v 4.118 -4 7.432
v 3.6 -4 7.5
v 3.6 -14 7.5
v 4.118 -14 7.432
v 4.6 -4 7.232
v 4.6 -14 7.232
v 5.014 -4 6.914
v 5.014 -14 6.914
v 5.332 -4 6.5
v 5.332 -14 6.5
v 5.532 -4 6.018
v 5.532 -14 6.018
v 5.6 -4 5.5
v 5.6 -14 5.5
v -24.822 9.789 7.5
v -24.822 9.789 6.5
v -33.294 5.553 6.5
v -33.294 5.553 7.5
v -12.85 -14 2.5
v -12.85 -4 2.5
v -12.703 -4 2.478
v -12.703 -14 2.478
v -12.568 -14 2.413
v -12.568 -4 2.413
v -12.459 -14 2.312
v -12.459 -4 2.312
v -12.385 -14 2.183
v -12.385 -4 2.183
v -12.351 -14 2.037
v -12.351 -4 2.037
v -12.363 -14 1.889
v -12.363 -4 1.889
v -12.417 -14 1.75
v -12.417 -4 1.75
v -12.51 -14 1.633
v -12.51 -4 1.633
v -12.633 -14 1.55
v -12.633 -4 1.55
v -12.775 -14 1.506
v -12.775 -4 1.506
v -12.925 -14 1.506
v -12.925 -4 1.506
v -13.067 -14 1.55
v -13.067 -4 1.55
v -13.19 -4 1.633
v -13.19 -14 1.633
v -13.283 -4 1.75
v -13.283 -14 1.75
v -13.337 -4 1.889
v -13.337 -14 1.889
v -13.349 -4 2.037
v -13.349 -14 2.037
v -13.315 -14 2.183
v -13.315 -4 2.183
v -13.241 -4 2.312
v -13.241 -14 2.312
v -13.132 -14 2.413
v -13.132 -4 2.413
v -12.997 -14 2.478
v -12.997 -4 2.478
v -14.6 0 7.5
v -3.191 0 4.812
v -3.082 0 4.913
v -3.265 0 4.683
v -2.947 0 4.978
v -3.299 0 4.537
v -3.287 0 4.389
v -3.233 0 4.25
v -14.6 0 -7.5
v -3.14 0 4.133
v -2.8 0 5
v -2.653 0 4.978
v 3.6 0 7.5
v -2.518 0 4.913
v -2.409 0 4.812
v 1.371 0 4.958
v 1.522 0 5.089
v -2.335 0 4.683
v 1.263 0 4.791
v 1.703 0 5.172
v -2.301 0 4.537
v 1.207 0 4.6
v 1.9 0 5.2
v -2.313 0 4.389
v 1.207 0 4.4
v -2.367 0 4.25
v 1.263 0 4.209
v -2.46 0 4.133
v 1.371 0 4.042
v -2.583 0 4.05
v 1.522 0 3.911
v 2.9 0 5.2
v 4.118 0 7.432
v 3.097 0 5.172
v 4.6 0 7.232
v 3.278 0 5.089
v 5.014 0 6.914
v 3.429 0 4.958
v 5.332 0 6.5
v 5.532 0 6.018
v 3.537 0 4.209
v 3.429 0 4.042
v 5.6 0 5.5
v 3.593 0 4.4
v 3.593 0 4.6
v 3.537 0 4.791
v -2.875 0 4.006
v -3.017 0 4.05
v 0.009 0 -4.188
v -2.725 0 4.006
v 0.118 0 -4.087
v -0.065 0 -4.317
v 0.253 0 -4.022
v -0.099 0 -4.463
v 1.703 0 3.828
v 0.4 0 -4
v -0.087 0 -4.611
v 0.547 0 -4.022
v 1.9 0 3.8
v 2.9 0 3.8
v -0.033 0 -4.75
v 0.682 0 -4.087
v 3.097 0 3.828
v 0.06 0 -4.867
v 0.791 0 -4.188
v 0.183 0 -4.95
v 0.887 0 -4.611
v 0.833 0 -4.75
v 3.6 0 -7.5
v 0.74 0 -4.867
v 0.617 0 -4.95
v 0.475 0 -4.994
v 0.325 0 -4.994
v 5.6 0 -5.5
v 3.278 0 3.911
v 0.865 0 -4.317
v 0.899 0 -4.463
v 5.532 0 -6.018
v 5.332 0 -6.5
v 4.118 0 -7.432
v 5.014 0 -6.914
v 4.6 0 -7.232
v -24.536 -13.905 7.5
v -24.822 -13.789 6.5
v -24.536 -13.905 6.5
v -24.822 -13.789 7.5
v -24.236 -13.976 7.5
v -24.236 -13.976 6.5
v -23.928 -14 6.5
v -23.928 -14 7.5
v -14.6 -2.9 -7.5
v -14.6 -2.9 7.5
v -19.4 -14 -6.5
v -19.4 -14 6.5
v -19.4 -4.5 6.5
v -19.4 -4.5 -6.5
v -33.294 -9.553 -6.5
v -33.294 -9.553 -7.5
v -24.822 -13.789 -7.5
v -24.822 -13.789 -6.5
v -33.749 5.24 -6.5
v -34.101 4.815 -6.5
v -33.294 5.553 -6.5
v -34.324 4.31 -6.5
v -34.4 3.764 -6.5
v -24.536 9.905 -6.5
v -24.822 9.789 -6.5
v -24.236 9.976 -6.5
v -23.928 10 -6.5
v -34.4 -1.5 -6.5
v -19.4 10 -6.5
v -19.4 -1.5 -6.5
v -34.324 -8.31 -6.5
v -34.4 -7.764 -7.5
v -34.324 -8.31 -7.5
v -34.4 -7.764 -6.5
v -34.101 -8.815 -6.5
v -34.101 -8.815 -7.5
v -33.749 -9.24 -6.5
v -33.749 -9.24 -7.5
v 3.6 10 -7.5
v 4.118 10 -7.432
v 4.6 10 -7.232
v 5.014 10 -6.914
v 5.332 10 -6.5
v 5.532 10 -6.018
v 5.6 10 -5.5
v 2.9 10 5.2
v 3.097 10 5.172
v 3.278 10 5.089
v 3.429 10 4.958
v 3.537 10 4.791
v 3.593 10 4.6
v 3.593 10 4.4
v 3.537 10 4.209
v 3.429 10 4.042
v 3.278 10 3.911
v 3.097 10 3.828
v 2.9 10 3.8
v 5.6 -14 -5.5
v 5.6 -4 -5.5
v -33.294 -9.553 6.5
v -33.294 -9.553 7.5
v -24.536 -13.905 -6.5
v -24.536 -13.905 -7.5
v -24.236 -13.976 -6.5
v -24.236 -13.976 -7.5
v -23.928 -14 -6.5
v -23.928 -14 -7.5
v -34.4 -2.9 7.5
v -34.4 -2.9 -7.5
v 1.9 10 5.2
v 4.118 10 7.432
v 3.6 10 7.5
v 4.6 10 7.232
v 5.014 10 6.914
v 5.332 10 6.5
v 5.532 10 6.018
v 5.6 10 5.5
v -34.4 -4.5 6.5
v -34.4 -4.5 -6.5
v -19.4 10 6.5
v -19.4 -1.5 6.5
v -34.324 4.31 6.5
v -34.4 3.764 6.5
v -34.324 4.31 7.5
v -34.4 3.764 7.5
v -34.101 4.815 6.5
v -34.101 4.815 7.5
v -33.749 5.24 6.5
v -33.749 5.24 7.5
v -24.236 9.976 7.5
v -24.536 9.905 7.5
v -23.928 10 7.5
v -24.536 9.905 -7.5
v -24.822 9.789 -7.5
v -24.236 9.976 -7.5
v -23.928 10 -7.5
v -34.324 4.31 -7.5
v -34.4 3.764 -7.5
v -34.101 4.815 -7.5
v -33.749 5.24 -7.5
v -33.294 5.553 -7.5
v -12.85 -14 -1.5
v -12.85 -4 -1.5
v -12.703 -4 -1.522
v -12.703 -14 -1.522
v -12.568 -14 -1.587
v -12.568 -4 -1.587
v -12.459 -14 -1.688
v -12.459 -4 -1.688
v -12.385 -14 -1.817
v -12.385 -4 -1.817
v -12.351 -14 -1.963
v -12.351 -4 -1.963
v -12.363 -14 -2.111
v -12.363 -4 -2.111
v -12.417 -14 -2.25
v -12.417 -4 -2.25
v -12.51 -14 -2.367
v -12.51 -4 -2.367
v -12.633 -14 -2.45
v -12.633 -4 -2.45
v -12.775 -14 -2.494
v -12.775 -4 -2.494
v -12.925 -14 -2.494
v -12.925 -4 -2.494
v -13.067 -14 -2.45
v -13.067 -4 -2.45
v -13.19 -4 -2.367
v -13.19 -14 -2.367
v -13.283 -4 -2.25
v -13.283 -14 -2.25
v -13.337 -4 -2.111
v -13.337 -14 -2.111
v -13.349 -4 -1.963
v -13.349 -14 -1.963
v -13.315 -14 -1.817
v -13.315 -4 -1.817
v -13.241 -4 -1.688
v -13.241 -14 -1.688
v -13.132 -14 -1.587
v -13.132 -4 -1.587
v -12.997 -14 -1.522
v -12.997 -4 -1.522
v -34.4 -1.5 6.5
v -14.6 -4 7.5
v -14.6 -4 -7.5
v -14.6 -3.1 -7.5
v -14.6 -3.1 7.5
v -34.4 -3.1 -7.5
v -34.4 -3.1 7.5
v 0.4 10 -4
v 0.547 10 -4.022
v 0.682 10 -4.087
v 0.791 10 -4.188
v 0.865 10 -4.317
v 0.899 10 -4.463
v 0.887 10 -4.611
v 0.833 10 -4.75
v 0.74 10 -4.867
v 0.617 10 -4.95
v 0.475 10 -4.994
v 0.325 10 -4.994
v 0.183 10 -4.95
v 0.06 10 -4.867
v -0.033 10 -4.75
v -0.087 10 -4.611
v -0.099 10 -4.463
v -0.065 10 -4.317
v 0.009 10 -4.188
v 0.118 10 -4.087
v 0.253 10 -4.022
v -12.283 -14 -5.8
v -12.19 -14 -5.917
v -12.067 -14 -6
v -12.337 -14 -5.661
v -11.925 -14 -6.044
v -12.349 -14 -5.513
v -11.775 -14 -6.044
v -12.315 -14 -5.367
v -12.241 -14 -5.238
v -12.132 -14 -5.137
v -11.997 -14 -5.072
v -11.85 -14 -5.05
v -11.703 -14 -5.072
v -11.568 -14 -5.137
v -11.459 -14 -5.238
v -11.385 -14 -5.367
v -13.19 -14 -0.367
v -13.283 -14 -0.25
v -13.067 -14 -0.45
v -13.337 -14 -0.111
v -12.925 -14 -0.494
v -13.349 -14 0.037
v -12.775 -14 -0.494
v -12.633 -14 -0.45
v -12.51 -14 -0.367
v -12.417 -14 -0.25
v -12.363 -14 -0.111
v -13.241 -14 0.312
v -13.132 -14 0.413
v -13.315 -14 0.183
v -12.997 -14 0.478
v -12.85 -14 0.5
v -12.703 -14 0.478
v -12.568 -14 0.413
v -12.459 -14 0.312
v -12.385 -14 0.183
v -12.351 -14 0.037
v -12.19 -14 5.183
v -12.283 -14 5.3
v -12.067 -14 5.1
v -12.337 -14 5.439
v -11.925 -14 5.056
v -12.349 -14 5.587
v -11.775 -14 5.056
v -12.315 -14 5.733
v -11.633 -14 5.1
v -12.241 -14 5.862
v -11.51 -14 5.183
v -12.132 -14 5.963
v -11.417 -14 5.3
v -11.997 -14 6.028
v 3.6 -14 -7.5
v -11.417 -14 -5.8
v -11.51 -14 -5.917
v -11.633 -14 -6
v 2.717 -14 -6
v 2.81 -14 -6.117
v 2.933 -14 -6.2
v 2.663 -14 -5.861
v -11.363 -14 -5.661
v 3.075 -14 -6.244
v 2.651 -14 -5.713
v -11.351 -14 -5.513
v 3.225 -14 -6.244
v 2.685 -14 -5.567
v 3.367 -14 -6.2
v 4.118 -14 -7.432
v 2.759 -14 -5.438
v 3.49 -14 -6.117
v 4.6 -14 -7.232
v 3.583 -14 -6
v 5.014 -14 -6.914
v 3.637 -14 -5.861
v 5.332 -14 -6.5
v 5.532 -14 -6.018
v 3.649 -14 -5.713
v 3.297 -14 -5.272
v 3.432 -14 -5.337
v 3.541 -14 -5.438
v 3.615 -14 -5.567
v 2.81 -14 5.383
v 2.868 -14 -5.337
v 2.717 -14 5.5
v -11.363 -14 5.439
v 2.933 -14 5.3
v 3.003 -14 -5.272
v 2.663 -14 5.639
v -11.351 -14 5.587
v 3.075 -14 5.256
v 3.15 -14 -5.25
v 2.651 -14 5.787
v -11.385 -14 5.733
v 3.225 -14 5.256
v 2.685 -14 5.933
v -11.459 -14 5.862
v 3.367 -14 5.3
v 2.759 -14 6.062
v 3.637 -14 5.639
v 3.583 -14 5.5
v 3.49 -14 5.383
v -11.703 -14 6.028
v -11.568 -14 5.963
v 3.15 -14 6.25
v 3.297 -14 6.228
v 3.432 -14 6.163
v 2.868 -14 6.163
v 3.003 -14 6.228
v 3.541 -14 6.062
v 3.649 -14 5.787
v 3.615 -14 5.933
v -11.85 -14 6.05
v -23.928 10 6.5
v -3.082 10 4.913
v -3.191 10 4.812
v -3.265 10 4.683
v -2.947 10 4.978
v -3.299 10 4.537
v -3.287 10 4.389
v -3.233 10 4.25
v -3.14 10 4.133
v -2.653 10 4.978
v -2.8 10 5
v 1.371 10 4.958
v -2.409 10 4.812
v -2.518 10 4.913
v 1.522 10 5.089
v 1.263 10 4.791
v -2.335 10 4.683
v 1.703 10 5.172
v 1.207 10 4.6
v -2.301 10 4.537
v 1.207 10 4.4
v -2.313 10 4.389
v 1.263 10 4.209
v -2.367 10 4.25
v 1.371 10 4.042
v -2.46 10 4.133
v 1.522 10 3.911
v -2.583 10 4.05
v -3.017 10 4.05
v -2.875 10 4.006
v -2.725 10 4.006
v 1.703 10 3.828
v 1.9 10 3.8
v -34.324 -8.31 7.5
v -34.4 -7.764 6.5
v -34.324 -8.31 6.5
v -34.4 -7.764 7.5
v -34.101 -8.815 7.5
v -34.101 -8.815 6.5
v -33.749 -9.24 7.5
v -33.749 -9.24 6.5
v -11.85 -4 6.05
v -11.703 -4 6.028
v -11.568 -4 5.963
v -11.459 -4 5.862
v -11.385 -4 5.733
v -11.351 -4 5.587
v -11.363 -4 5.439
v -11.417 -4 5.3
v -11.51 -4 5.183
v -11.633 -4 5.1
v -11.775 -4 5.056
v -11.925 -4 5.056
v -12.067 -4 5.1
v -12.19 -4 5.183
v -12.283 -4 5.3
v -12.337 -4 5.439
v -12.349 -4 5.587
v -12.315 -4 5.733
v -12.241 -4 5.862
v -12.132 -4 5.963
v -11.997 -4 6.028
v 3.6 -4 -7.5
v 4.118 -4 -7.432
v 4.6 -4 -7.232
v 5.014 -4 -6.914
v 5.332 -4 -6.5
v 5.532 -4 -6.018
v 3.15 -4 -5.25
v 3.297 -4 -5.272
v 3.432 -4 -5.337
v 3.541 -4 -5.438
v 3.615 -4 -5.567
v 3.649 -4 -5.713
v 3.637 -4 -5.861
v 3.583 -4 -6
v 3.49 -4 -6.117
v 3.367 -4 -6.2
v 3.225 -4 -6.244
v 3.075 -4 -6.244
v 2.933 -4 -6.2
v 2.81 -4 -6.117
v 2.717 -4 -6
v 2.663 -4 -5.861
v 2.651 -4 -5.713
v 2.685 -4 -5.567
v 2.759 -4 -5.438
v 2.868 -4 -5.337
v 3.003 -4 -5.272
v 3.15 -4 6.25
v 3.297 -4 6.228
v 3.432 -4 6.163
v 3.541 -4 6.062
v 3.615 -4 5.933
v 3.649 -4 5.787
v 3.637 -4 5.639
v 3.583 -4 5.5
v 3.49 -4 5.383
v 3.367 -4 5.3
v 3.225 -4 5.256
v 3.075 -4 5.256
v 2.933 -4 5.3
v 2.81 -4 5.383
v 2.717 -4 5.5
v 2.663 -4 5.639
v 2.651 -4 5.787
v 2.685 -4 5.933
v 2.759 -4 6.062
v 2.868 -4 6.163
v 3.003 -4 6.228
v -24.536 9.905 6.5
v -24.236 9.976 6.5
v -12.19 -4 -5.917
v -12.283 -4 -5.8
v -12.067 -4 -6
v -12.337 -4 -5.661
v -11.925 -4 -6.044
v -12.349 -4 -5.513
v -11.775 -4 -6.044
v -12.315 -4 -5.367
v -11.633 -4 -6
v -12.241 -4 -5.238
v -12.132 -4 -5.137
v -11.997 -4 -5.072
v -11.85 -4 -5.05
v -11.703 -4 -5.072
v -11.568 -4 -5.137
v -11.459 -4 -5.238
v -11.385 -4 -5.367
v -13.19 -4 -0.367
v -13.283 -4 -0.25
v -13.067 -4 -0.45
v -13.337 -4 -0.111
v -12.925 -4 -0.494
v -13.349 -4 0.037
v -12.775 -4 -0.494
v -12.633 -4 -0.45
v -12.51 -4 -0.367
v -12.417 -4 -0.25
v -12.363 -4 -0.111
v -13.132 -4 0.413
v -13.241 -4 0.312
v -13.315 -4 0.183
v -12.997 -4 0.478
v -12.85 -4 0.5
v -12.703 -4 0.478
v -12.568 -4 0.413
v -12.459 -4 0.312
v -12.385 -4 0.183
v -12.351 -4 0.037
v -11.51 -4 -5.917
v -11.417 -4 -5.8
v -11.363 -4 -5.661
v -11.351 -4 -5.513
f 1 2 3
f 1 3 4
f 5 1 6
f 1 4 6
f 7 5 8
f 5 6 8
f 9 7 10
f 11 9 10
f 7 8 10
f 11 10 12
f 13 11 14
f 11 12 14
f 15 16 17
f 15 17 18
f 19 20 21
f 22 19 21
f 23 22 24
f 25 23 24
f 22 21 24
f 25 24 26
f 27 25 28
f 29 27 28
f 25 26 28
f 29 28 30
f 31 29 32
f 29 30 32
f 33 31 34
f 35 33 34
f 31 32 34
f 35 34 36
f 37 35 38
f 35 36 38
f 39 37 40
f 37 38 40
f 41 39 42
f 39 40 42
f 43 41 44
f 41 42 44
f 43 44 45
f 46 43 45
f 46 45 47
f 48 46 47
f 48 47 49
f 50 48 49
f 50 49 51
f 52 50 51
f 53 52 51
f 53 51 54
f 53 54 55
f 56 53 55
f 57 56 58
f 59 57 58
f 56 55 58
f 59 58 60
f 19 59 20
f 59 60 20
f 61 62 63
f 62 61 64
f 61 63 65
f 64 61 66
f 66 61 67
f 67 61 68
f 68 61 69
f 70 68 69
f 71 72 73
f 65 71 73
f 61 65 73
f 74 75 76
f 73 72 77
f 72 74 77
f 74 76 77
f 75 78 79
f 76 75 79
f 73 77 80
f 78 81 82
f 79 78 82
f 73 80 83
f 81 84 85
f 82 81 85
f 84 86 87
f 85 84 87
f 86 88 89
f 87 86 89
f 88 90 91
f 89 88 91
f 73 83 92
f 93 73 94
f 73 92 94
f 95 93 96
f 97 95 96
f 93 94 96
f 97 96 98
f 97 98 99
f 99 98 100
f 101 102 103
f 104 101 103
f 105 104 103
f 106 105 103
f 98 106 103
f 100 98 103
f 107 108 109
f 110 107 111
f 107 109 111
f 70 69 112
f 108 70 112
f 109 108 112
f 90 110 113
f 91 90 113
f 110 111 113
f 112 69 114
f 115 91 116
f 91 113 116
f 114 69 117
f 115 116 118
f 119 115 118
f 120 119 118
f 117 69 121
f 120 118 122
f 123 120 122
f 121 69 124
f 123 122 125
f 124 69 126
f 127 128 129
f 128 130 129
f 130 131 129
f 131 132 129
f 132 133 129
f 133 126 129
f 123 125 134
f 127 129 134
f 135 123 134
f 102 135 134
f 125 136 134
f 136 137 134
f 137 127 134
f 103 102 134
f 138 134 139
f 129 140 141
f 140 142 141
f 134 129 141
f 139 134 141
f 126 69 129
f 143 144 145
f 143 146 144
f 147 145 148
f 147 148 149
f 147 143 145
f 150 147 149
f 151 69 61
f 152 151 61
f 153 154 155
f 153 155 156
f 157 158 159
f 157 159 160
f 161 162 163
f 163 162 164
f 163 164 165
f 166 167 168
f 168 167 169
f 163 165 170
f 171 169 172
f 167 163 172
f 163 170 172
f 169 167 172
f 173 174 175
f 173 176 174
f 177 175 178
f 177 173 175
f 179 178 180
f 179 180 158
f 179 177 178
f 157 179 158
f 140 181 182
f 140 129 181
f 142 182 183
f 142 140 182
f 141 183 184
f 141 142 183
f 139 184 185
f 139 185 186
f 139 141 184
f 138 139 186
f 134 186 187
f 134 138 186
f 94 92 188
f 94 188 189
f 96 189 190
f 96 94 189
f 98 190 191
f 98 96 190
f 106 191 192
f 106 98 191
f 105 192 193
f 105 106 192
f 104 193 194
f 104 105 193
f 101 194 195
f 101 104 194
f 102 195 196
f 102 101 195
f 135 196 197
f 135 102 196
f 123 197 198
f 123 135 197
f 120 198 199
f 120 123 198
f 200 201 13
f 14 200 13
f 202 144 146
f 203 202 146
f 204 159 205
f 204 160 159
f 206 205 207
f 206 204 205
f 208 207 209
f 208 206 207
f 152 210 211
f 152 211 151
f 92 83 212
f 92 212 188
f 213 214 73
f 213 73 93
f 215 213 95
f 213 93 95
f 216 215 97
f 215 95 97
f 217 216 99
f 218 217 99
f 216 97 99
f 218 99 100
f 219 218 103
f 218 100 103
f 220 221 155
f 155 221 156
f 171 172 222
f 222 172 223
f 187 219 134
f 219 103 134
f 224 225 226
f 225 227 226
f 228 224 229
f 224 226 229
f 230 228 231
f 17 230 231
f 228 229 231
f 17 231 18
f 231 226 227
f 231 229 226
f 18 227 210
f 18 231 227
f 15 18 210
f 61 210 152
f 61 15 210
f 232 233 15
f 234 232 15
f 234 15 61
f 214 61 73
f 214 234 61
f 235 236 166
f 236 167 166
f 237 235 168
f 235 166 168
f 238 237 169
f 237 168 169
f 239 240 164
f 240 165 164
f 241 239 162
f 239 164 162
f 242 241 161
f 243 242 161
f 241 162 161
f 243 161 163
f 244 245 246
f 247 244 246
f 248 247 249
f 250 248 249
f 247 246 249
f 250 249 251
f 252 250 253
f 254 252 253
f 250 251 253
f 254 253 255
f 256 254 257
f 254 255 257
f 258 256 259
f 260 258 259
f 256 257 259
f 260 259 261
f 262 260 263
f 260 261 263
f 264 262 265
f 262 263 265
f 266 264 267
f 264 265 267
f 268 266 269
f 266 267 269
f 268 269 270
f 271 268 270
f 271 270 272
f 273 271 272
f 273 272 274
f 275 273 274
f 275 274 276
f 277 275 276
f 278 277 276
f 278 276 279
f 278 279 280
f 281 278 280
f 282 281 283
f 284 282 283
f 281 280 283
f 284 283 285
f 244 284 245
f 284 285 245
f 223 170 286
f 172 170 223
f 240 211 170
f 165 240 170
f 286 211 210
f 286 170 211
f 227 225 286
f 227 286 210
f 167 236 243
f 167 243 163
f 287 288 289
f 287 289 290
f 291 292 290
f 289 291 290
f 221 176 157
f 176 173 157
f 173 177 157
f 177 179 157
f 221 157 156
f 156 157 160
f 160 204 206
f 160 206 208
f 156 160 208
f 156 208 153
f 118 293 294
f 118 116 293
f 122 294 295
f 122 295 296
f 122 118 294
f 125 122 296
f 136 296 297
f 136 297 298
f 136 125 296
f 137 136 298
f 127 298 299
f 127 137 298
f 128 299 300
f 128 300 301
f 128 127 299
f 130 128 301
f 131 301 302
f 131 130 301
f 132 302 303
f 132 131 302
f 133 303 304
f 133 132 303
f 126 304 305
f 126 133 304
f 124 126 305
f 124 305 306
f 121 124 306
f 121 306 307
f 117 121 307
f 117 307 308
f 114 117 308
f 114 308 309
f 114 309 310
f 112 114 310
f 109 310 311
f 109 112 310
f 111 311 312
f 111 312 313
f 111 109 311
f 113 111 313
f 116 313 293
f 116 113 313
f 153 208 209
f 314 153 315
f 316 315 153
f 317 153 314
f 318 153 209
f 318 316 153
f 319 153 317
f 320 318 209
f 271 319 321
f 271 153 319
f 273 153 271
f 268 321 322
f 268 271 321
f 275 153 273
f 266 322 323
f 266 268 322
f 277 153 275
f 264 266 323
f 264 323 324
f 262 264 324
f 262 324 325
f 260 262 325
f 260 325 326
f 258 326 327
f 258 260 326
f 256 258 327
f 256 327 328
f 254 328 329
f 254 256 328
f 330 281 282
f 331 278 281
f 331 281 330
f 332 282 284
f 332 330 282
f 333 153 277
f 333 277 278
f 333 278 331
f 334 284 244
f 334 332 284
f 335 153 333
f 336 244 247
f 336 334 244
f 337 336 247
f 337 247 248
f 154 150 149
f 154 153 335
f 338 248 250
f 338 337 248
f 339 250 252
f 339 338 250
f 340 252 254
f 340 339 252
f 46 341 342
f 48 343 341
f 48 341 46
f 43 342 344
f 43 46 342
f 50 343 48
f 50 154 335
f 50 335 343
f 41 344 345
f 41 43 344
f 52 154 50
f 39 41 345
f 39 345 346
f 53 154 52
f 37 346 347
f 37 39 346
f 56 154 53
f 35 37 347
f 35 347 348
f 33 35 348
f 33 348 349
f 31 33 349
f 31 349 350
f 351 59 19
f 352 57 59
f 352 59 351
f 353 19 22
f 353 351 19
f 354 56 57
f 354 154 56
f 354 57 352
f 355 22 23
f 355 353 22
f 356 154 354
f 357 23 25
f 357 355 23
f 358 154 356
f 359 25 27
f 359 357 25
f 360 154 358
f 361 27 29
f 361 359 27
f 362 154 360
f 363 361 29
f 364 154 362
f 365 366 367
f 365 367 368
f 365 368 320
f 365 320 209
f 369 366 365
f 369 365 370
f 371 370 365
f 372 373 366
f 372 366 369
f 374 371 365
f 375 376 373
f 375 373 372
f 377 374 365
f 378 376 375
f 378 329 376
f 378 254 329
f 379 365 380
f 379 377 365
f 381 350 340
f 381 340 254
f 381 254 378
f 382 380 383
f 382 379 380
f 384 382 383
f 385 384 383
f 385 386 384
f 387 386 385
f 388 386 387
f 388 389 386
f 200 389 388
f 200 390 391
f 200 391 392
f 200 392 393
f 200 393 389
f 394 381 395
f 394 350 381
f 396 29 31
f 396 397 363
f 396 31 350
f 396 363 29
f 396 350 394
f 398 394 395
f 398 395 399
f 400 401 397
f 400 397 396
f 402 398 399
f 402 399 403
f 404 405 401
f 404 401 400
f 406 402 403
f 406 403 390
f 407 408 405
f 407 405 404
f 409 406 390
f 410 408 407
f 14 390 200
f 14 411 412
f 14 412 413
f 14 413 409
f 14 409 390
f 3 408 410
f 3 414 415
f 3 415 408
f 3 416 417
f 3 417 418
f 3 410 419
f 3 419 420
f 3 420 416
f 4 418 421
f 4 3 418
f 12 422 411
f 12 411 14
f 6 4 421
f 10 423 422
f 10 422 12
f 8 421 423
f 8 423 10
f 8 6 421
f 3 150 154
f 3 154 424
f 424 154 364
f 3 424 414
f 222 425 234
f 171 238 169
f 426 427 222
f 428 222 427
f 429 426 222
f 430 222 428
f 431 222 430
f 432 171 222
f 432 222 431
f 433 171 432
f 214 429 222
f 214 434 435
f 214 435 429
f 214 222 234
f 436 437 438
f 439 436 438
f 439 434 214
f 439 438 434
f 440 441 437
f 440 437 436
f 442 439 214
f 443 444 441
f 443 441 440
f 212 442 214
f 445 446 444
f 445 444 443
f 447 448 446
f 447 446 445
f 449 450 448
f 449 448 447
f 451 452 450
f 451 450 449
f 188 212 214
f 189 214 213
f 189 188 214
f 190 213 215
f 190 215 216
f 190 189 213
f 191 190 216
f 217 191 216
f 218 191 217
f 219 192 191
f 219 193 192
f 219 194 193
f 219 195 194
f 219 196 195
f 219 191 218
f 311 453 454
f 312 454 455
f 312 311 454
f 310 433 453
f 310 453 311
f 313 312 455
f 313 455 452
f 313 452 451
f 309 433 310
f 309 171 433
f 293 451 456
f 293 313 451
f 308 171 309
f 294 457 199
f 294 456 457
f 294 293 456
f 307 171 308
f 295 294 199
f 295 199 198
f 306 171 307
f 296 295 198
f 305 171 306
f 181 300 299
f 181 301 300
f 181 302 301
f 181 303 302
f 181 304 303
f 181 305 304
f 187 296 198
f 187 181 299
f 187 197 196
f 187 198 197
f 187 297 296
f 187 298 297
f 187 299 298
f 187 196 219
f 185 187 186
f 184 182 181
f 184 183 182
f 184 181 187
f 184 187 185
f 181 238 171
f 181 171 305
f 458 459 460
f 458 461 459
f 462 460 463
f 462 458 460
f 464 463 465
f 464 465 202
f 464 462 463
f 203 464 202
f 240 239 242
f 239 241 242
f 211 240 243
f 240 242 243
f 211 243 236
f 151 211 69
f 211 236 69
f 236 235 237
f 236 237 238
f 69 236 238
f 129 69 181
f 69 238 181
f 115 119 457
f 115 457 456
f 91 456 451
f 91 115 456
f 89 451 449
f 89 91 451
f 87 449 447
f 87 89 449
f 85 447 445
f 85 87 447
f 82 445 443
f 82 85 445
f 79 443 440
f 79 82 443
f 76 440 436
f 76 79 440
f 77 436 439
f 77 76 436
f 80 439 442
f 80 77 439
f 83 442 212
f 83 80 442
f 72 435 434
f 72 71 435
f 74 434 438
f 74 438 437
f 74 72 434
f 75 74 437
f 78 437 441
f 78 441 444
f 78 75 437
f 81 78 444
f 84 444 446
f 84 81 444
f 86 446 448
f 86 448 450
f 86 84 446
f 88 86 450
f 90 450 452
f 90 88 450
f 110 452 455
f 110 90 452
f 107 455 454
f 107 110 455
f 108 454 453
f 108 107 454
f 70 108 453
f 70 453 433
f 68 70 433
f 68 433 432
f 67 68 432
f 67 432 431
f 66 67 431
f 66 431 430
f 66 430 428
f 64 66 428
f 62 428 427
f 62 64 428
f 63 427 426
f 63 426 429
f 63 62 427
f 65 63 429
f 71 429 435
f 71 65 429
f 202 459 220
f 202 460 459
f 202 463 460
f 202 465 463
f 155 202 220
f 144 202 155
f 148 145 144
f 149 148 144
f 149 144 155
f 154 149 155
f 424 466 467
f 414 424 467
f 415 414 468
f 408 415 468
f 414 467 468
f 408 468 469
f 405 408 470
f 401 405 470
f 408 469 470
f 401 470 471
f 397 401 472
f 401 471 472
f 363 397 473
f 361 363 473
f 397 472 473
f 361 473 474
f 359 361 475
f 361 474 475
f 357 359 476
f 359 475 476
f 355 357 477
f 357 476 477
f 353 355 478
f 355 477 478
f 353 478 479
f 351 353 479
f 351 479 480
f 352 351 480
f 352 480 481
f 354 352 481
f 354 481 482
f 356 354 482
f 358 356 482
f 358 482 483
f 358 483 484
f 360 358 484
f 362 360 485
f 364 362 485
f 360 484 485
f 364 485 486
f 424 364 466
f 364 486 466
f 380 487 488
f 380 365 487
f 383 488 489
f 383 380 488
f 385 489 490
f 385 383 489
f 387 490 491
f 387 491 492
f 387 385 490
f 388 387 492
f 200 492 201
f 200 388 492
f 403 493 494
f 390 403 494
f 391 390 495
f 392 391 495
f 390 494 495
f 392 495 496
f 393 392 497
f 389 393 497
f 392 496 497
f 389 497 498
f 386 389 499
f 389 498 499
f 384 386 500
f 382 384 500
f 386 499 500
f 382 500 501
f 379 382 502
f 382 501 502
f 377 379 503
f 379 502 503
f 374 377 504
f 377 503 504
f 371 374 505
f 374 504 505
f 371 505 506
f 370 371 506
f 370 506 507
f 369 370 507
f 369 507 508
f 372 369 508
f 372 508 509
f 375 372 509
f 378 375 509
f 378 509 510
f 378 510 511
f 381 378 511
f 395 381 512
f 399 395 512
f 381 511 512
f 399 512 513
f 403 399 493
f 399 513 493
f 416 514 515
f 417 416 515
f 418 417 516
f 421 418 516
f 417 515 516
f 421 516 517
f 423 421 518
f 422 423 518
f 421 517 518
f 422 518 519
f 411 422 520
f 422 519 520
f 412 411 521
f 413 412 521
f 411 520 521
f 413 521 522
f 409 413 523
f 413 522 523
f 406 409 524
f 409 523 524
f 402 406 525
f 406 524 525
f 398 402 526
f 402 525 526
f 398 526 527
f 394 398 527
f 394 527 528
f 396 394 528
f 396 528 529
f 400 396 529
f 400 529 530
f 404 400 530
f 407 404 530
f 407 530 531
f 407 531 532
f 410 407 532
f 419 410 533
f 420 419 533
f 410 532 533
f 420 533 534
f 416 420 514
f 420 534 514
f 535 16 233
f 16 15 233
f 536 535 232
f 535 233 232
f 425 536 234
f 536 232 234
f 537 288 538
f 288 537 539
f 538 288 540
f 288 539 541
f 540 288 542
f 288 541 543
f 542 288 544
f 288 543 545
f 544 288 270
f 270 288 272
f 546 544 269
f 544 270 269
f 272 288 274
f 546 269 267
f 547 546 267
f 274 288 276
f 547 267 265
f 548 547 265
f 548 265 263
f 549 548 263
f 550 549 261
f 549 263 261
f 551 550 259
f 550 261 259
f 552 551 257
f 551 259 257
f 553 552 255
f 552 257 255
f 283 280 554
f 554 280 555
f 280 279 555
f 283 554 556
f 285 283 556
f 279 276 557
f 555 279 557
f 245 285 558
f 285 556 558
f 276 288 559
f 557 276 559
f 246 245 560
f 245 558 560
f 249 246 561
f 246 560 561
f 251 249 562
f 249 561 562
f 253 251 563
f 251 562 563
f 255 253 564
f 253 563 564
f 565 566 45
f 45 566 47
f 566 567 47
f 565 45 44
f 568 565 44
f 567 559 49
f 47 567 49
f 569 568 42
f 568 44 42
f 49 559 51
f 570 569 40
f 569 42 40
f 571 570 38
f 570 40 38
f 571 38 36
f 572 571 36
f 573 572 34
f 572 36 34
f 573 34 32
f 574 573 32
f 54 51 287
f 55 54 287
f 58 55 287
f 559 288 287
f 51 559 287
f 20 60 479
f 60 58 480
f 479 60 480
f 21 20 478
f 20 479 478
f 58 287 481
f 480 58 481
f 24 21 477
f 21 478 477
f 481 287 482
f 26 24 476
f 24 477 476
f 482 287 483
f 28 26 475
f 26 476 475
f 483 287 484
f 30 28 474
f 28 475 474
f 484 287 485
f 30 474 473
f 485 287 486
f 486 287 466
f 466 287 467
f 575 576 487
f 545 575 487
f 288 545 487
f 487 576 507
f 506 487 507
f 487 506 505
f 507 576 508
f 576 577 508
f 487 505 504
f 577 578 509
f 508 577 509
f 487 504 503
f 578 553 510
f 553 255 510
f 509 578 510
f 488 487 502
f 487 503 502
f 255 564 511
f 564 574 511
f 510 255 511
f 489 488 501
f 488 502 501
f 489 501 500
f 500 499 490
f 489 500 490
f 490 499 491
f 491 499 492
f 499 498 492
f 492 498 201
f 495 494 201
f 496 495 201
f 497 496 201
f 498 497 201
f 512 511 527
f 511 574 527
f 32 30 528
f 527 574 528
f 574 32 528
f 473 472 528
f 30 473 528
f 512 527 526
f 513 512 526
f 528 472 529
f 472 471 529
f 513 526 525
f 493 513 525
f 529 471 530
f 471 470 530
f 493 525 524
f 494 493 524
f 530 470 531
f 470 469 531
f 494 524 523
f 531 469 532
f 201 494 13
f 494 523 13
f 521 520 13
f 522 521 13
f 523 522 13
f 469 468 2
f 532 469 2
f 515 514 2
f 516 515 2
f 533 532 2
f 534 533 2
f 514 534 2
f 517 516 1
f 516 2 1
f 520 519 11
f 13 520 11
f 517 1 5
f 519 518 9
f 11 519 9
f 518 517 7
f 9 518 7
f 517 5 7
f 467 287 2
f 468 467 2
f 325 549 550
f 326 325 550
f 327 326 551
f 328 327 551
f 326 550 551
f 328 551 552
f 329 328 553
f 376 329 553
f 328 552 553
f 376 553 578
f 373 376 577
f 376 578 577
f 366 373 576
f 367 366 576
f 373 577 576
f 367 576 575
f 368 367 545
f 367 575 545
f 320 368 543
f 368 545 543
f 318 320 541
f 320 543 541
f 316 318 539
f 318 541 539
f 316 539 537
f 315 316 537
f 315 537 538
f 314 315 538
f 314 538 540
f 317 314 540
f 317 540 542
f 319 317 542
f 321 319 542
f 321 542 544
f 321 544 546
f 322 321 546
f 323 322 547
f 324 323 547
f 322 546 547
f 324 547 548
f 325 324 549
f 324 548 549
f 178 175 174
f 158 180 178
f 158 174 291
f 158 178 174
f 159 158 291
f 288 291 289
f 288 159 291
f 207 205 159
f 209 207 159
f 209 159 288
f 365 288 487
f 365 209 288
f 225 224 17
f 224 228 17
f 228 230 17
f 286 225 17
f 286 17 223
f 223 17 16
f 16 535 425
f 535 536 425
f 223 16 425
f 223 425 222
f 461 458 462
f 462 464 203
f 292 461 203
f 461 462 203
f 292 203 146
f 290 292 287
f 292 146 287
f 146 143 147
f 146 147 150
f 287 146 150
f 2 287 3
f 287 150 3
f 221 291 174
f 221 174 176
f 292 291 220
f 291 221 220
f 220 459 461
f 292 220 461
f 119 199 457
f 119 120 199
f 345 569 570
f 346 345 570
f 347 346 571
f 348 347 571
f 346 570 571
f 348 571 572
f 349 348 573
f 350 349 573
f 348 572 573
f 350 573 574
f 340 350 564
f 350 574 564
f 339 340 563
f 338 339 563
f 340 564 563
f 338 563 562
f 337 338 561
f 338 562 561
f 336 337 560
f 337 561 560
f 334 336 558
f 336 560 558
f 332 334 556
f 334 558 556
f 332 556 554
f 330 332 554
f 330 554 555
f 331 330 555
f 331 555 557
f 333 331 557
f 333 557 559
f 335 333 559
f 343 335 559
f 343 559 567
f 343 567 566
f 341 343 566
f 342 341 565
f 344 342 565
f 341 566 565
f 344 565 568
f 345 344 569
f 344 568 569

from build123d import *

# Parameters (mm, degrees)
SKETCH1_W           = 40
SKETCH1_H           = 15
SKETCH1_R           = 0.5
BOSS_EXTRUDE1_DEPTH = 3
SKETCH2_R           = 0.5
BOSS_EXTRUDE2_DEPTH = 7
BOSS_EXTRUDE3_START = 4
SKETCH3_W           = 40
SKETCH3_H           = 15
BOSS_EXTRUDE3_DEPTH = 10
SKETCH4_W           = 19.8
SKETCH4_H           = 15
BOSS_EXTRUDE4_DEPTH = 2.9
BOSS_EXTRUDE5_START = 4
SKETCH4_2_W         = 19.8
SKETCH4_2_H         = 15
BOSS_EXTRUDE5_DEPTH = 0.9
SKETCH5_W           = 15
SKETCH5_H           = 13
CUT_EXTRUDE1_DEPTH  = 4.5
CUT_EXTRUDE2_START  = -17
SKETCH5_2_W         = 15
SKETCH5_2_H         = 13
CUT_EXTRUDE2_DEPTH  = 9.5
SKETCH7_R           = 0.5
CUT_EXTRUDE3_DEPTH  = 10
CHAMFER1_SIZE       = 5
CHAMFER1_SIZE2      = 10
FILLET2_R           = 2
CHAMFER2_SIZE       = 5
CHAMFER2_SIZE2      = 10
FILLET3_R           = 2
FILLET4_R           = 2
FILLET5_R           = 2


with BuildPart() as part:
    # Sketch1 → Boss-Extrude1 (new body)
    with BuildSketch(Plane(origin=(0, 0, 0), x_dir=(1, 0, 0), z_dir=(0, 1, 0))):
        with Locations((-14.4, 0)):
            Rectangle(SKETCH1_W, SKETCH1_H)
        with Locations(Location((0.4, 4.5, 0), (0, 0, 270))):
            Circle(SKETCH1_R, mode=Mode.SUBTRACT)
        with Locations(Location((-2.8, -4.5, 0), (0, 0, 270))):
            Circle(SKETCH1_R, mode=Mode.SUBTRACT)
        with BuildLine():
            Line((1.9, -3.8), (2.9, -3.8))
            ThreePointArc((2.9, -3.8), (3.6, -4.5), (2.9, -5.2))
            Line((2.9, -5.2), (1.9, -5.2))
            ThreePointArc((1.9, -5.2), (1.2, -4.5), (1.9, -3.8))
        make_face(mode=Mode.SUBTRACT)
    extrude(amount=BOSS_EXTRUDE1_DEPTH)

    # Sketch2 → Boss-Extrude2 (add)
    with BuildSketch(Plane(origin=(0, 3, 0), x_dir=(1, 0, 0), z_dir=(0, 1, 0))):
        Polygon((-34.4, 7.5), (-34.4, 6.5), (-19.4, 6.5), (-19.4, -6.5), (-34.4, -6.5), (-34.4, -7.5), (5.6, -7.5), (5.6, 7.5), align=None)
        with Locations(Location((-2.8, -4.5, 0), (0, 0, 270))):
            Circle(SKETCH2_R, mode=Mode.SUBTRACT)
        with Locations(Location((0.4, 4.5, 0), (0, 0, 270))):
            Circle(SKETCH2_R, mode=Mode.SUBTRACT)
        with BuildLine():
            Line((2.9, -3.8), (1.9, -3.8))
            ThreePointArc((1.9, -3.8), (1.2, -4.5), (1.9, -5.2))
            Line((1.9, -5.2), (2.9, -5.2))
            ThreePointArc((2.9, -5.2), (3.6, -4.5), (2.9, -3.8))
        make_face(mode=Mode.SUBTRACT)
    extrude(amount=BOSS_EXTRUDE2_DEPTH)

    # Sketch4 → Boss-Extrude4 (add)
    with BuildSketch(Plane.XZ):
        with Locations((-24.5, 0)):
            Rectangle(SKETCH4_W, SKETCH4_H)
    extrude(amount=BOSS_EXTRUDE4_DEPTH)

    # Sketch5 → Cut-Extrude1 (cut)
    with BuildSketch(Plane(origin=(0, 3, 0), x_dir=(1, 0, 0), z_dir=(0, 1, 0))):
        with Locations((-26.9, 0)):
            Rectangle(SKETCH5_W, SKETCH5_H)
    extrude(amount=-CUT_EXTRUDE1_DEPTH, mode=Mode.SUBTRACT)

    # Chamfer1
    chamfer1_edges = [part.edges().sort_by_distance(p)[0] for p in [
        (-34.4, 10, -7),
        (-34.4, 10, 7),
    ]]
    chamfer1_side = [part.faces().sort_by_distance(p)[0] for p in [
        (-34.4, 9.802159155, 7),
    ]]
    chamfer(chamfer1_edges, length=CHAMFER1_SIZE, length2=CHAMFER1_SIZE2, reference=chamfer1_side[0])

    # Fillet2
    fillet2_edges = [part.edges().sort_by_distance(p)[0] for p in [
        (-24.4, 10, -7),
        (-24.4, 10, 7),
        (-34.4, 5, -7),
        (-34.4, 5, 7),
    ]]
    fillet(fillet2_edges, radius=FILLET2_R)

    # Fillet4
    fillet4_edges = [part.edges().sort_by_distance(p)[0] for p in [
        (5.6, 5, -7.5),
        (5.6, 5, 7.5),
    ]]
    fillet(fillet4_edges, radius=FILLET4_R)


with BuildPart() as body_2:
    # Sketch3 → Boss-Extrude3 (new body)
    with BuildSketch(Plane.XZ.offset(BOSS_EXTRUDE3_START)):
        with Locations((-14.4, 0)):
            Rectangle(SKETCH3_W, SKETCH3_H)
    extrude(amount=BOSS_EXTRUDE3_DEPTH)

    # Sketch4<2> → Boss-Extrude5 (add)
    with BuildSketch(Plane.XZ.offset(BOSS_EXTRUDE5_START)):
        with Locations((-24.5, 0)):
            Rectangle(SKETCH4_2_W, SKETCH4_2_H)
    extrude(amount=-BOSS_EXTRUDE5_DEPTH)

    # Sketch5<2> → Cut-Extrude2 (cut)
    with BuildSketch(Plane(origin=(0, 3, 0), x_dir=(1, 0, 0), z_dir=(0, 1, 0)).offset(CUT_EXTRUDE2_START)):
        with Locations((-26.9, 0)):
            Rectangle(SKETCH5_2_W, SKETCH5_2_H)
    extrude(amount=CUT_EXTRUDE2_DEPTH, mode=Mode.SUBTRACT)

    # Sketch7 → Cut-Extrude3 (cut)
    with BuildSketch(Plane(origin=(0, -4, 0), x_dir=(1, 0, 0), z_dir=(0, 1, 0))):
        with Locations(Location((3.15, 5.75, 0), (0, 0, 270))):
            Circle(SKETCH7_R)
        with Locations(Location((3.15, -5.75, 0), (0, 0, 270))):
            Circle(SKETCH7_R)
        with Locations(Location((-11.85, 5.55, 0), (0, 0, 270))):
            Circle(SKETCH7_R)
        with Locations(Location((-11.85, -5.55, 0), (0, 0, 270))):
            Circle(SKETCH7_R)
        with Locations(Location((-12.85, 0, 0), (0, 0, 270))):
            Circle(SKETCH7_R)
        with Locations(Location((-12.85, -2, 0), (0, 0, 270))):
            Circle(SKETCH7_R)
        with Locations(Location((-12.85, 2, 0), (0, 0, 270))):
            Circle(SKETCH7_R)
    extrude(amount=-CUT_EXTRUDE3_DEPTH, mode=Mode.SUBTRACT)

    # Chamfer2
    chamfer2_edges = [body_2.edges().sort_by_distance(p)[0] for p in [
        (-34.4, -14, -7),
        (-34.4, -14, 7),
    ]]
    chamfer2_side = [body_2.faces().sort_by_distance(p)[0] for p in [
        (-34.4, -8.55, -7.314578858),
    ]]
    chamfer(chamfer2_edges, length=CHAMFER2_SIZE, length2=CHAMFER2_SIZE2, reference=chamfer2_side[0])

    # Fillet3
    fillet3_edges = [body_2.edges().sort_by_distance(p)[0] for p in [
        (-24.4, -14, 7),
        (-24.4, -14, -7),
        (-34.4, -9, 7),
        (-34.4, -9, -7),
    ]]
    fillet(fillet3_edges, radius=FILLET3_R)

    # Fillet5
    fillet5_edges = [body_2.edges().sort_by_distance(p)[0] for p in [
        (5.6, -9, 7.5),
        (5.6, -9, -7.5),
    ]]
    fillet(fillet5_edges, radius=FILLET5_R)


solid = Compound([part.part, body_2.part])
